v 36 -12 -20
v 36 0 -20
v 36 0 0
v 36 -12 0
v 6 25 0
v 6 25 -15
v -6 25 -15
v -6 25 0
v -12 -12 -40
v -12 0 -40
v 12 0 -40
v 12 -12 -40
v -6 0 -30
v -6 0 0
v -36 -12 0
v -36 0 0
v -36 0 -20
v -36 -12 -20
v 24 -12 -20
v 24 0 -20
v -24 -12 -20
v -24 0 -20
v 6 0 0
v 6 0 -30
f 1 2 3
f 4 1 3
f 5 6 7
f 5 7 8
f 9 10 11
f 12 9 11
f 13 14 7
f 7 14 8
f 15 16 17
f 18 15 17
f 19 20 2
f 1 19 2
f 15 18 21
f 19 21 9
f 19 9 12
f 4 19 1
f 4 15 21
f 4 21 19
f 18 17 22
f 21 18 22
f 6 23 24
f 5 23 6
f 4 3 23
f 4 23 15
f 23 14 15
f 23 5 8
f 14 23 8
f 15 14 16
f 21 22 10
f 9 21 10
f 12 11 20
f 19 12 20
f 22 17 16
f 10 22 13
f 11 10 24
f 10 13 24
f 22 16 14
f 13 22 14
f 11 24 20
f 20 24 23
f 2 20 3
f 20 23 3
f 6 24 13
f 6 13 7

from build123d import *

# Parameters (mm, degrees)
F1_DEPTH = 12
F4_DEPTH = 12


with BuildPart() as f1:
    # F0 (on Front) → F1 (new body)
    with BuildSketch(Plane.XZ):
        Polygon((36, 0), (-36, 0), (-36, -20), (-24, -20), (-12, -40), (12, -40), (24, -20), (36, -20), align=None)
    extrude(amount=F1_DEPTH)

    # F3 (on offset) → F4 (join)
    with BuildSketch(Plane.YZ.offset(6)):
        Polygon((0, 0), (0, -20), (0, -30), (25, -15), (25, 0), align=None)
    extrude(amount=-F4_DEPTH)


solid = f1.part
